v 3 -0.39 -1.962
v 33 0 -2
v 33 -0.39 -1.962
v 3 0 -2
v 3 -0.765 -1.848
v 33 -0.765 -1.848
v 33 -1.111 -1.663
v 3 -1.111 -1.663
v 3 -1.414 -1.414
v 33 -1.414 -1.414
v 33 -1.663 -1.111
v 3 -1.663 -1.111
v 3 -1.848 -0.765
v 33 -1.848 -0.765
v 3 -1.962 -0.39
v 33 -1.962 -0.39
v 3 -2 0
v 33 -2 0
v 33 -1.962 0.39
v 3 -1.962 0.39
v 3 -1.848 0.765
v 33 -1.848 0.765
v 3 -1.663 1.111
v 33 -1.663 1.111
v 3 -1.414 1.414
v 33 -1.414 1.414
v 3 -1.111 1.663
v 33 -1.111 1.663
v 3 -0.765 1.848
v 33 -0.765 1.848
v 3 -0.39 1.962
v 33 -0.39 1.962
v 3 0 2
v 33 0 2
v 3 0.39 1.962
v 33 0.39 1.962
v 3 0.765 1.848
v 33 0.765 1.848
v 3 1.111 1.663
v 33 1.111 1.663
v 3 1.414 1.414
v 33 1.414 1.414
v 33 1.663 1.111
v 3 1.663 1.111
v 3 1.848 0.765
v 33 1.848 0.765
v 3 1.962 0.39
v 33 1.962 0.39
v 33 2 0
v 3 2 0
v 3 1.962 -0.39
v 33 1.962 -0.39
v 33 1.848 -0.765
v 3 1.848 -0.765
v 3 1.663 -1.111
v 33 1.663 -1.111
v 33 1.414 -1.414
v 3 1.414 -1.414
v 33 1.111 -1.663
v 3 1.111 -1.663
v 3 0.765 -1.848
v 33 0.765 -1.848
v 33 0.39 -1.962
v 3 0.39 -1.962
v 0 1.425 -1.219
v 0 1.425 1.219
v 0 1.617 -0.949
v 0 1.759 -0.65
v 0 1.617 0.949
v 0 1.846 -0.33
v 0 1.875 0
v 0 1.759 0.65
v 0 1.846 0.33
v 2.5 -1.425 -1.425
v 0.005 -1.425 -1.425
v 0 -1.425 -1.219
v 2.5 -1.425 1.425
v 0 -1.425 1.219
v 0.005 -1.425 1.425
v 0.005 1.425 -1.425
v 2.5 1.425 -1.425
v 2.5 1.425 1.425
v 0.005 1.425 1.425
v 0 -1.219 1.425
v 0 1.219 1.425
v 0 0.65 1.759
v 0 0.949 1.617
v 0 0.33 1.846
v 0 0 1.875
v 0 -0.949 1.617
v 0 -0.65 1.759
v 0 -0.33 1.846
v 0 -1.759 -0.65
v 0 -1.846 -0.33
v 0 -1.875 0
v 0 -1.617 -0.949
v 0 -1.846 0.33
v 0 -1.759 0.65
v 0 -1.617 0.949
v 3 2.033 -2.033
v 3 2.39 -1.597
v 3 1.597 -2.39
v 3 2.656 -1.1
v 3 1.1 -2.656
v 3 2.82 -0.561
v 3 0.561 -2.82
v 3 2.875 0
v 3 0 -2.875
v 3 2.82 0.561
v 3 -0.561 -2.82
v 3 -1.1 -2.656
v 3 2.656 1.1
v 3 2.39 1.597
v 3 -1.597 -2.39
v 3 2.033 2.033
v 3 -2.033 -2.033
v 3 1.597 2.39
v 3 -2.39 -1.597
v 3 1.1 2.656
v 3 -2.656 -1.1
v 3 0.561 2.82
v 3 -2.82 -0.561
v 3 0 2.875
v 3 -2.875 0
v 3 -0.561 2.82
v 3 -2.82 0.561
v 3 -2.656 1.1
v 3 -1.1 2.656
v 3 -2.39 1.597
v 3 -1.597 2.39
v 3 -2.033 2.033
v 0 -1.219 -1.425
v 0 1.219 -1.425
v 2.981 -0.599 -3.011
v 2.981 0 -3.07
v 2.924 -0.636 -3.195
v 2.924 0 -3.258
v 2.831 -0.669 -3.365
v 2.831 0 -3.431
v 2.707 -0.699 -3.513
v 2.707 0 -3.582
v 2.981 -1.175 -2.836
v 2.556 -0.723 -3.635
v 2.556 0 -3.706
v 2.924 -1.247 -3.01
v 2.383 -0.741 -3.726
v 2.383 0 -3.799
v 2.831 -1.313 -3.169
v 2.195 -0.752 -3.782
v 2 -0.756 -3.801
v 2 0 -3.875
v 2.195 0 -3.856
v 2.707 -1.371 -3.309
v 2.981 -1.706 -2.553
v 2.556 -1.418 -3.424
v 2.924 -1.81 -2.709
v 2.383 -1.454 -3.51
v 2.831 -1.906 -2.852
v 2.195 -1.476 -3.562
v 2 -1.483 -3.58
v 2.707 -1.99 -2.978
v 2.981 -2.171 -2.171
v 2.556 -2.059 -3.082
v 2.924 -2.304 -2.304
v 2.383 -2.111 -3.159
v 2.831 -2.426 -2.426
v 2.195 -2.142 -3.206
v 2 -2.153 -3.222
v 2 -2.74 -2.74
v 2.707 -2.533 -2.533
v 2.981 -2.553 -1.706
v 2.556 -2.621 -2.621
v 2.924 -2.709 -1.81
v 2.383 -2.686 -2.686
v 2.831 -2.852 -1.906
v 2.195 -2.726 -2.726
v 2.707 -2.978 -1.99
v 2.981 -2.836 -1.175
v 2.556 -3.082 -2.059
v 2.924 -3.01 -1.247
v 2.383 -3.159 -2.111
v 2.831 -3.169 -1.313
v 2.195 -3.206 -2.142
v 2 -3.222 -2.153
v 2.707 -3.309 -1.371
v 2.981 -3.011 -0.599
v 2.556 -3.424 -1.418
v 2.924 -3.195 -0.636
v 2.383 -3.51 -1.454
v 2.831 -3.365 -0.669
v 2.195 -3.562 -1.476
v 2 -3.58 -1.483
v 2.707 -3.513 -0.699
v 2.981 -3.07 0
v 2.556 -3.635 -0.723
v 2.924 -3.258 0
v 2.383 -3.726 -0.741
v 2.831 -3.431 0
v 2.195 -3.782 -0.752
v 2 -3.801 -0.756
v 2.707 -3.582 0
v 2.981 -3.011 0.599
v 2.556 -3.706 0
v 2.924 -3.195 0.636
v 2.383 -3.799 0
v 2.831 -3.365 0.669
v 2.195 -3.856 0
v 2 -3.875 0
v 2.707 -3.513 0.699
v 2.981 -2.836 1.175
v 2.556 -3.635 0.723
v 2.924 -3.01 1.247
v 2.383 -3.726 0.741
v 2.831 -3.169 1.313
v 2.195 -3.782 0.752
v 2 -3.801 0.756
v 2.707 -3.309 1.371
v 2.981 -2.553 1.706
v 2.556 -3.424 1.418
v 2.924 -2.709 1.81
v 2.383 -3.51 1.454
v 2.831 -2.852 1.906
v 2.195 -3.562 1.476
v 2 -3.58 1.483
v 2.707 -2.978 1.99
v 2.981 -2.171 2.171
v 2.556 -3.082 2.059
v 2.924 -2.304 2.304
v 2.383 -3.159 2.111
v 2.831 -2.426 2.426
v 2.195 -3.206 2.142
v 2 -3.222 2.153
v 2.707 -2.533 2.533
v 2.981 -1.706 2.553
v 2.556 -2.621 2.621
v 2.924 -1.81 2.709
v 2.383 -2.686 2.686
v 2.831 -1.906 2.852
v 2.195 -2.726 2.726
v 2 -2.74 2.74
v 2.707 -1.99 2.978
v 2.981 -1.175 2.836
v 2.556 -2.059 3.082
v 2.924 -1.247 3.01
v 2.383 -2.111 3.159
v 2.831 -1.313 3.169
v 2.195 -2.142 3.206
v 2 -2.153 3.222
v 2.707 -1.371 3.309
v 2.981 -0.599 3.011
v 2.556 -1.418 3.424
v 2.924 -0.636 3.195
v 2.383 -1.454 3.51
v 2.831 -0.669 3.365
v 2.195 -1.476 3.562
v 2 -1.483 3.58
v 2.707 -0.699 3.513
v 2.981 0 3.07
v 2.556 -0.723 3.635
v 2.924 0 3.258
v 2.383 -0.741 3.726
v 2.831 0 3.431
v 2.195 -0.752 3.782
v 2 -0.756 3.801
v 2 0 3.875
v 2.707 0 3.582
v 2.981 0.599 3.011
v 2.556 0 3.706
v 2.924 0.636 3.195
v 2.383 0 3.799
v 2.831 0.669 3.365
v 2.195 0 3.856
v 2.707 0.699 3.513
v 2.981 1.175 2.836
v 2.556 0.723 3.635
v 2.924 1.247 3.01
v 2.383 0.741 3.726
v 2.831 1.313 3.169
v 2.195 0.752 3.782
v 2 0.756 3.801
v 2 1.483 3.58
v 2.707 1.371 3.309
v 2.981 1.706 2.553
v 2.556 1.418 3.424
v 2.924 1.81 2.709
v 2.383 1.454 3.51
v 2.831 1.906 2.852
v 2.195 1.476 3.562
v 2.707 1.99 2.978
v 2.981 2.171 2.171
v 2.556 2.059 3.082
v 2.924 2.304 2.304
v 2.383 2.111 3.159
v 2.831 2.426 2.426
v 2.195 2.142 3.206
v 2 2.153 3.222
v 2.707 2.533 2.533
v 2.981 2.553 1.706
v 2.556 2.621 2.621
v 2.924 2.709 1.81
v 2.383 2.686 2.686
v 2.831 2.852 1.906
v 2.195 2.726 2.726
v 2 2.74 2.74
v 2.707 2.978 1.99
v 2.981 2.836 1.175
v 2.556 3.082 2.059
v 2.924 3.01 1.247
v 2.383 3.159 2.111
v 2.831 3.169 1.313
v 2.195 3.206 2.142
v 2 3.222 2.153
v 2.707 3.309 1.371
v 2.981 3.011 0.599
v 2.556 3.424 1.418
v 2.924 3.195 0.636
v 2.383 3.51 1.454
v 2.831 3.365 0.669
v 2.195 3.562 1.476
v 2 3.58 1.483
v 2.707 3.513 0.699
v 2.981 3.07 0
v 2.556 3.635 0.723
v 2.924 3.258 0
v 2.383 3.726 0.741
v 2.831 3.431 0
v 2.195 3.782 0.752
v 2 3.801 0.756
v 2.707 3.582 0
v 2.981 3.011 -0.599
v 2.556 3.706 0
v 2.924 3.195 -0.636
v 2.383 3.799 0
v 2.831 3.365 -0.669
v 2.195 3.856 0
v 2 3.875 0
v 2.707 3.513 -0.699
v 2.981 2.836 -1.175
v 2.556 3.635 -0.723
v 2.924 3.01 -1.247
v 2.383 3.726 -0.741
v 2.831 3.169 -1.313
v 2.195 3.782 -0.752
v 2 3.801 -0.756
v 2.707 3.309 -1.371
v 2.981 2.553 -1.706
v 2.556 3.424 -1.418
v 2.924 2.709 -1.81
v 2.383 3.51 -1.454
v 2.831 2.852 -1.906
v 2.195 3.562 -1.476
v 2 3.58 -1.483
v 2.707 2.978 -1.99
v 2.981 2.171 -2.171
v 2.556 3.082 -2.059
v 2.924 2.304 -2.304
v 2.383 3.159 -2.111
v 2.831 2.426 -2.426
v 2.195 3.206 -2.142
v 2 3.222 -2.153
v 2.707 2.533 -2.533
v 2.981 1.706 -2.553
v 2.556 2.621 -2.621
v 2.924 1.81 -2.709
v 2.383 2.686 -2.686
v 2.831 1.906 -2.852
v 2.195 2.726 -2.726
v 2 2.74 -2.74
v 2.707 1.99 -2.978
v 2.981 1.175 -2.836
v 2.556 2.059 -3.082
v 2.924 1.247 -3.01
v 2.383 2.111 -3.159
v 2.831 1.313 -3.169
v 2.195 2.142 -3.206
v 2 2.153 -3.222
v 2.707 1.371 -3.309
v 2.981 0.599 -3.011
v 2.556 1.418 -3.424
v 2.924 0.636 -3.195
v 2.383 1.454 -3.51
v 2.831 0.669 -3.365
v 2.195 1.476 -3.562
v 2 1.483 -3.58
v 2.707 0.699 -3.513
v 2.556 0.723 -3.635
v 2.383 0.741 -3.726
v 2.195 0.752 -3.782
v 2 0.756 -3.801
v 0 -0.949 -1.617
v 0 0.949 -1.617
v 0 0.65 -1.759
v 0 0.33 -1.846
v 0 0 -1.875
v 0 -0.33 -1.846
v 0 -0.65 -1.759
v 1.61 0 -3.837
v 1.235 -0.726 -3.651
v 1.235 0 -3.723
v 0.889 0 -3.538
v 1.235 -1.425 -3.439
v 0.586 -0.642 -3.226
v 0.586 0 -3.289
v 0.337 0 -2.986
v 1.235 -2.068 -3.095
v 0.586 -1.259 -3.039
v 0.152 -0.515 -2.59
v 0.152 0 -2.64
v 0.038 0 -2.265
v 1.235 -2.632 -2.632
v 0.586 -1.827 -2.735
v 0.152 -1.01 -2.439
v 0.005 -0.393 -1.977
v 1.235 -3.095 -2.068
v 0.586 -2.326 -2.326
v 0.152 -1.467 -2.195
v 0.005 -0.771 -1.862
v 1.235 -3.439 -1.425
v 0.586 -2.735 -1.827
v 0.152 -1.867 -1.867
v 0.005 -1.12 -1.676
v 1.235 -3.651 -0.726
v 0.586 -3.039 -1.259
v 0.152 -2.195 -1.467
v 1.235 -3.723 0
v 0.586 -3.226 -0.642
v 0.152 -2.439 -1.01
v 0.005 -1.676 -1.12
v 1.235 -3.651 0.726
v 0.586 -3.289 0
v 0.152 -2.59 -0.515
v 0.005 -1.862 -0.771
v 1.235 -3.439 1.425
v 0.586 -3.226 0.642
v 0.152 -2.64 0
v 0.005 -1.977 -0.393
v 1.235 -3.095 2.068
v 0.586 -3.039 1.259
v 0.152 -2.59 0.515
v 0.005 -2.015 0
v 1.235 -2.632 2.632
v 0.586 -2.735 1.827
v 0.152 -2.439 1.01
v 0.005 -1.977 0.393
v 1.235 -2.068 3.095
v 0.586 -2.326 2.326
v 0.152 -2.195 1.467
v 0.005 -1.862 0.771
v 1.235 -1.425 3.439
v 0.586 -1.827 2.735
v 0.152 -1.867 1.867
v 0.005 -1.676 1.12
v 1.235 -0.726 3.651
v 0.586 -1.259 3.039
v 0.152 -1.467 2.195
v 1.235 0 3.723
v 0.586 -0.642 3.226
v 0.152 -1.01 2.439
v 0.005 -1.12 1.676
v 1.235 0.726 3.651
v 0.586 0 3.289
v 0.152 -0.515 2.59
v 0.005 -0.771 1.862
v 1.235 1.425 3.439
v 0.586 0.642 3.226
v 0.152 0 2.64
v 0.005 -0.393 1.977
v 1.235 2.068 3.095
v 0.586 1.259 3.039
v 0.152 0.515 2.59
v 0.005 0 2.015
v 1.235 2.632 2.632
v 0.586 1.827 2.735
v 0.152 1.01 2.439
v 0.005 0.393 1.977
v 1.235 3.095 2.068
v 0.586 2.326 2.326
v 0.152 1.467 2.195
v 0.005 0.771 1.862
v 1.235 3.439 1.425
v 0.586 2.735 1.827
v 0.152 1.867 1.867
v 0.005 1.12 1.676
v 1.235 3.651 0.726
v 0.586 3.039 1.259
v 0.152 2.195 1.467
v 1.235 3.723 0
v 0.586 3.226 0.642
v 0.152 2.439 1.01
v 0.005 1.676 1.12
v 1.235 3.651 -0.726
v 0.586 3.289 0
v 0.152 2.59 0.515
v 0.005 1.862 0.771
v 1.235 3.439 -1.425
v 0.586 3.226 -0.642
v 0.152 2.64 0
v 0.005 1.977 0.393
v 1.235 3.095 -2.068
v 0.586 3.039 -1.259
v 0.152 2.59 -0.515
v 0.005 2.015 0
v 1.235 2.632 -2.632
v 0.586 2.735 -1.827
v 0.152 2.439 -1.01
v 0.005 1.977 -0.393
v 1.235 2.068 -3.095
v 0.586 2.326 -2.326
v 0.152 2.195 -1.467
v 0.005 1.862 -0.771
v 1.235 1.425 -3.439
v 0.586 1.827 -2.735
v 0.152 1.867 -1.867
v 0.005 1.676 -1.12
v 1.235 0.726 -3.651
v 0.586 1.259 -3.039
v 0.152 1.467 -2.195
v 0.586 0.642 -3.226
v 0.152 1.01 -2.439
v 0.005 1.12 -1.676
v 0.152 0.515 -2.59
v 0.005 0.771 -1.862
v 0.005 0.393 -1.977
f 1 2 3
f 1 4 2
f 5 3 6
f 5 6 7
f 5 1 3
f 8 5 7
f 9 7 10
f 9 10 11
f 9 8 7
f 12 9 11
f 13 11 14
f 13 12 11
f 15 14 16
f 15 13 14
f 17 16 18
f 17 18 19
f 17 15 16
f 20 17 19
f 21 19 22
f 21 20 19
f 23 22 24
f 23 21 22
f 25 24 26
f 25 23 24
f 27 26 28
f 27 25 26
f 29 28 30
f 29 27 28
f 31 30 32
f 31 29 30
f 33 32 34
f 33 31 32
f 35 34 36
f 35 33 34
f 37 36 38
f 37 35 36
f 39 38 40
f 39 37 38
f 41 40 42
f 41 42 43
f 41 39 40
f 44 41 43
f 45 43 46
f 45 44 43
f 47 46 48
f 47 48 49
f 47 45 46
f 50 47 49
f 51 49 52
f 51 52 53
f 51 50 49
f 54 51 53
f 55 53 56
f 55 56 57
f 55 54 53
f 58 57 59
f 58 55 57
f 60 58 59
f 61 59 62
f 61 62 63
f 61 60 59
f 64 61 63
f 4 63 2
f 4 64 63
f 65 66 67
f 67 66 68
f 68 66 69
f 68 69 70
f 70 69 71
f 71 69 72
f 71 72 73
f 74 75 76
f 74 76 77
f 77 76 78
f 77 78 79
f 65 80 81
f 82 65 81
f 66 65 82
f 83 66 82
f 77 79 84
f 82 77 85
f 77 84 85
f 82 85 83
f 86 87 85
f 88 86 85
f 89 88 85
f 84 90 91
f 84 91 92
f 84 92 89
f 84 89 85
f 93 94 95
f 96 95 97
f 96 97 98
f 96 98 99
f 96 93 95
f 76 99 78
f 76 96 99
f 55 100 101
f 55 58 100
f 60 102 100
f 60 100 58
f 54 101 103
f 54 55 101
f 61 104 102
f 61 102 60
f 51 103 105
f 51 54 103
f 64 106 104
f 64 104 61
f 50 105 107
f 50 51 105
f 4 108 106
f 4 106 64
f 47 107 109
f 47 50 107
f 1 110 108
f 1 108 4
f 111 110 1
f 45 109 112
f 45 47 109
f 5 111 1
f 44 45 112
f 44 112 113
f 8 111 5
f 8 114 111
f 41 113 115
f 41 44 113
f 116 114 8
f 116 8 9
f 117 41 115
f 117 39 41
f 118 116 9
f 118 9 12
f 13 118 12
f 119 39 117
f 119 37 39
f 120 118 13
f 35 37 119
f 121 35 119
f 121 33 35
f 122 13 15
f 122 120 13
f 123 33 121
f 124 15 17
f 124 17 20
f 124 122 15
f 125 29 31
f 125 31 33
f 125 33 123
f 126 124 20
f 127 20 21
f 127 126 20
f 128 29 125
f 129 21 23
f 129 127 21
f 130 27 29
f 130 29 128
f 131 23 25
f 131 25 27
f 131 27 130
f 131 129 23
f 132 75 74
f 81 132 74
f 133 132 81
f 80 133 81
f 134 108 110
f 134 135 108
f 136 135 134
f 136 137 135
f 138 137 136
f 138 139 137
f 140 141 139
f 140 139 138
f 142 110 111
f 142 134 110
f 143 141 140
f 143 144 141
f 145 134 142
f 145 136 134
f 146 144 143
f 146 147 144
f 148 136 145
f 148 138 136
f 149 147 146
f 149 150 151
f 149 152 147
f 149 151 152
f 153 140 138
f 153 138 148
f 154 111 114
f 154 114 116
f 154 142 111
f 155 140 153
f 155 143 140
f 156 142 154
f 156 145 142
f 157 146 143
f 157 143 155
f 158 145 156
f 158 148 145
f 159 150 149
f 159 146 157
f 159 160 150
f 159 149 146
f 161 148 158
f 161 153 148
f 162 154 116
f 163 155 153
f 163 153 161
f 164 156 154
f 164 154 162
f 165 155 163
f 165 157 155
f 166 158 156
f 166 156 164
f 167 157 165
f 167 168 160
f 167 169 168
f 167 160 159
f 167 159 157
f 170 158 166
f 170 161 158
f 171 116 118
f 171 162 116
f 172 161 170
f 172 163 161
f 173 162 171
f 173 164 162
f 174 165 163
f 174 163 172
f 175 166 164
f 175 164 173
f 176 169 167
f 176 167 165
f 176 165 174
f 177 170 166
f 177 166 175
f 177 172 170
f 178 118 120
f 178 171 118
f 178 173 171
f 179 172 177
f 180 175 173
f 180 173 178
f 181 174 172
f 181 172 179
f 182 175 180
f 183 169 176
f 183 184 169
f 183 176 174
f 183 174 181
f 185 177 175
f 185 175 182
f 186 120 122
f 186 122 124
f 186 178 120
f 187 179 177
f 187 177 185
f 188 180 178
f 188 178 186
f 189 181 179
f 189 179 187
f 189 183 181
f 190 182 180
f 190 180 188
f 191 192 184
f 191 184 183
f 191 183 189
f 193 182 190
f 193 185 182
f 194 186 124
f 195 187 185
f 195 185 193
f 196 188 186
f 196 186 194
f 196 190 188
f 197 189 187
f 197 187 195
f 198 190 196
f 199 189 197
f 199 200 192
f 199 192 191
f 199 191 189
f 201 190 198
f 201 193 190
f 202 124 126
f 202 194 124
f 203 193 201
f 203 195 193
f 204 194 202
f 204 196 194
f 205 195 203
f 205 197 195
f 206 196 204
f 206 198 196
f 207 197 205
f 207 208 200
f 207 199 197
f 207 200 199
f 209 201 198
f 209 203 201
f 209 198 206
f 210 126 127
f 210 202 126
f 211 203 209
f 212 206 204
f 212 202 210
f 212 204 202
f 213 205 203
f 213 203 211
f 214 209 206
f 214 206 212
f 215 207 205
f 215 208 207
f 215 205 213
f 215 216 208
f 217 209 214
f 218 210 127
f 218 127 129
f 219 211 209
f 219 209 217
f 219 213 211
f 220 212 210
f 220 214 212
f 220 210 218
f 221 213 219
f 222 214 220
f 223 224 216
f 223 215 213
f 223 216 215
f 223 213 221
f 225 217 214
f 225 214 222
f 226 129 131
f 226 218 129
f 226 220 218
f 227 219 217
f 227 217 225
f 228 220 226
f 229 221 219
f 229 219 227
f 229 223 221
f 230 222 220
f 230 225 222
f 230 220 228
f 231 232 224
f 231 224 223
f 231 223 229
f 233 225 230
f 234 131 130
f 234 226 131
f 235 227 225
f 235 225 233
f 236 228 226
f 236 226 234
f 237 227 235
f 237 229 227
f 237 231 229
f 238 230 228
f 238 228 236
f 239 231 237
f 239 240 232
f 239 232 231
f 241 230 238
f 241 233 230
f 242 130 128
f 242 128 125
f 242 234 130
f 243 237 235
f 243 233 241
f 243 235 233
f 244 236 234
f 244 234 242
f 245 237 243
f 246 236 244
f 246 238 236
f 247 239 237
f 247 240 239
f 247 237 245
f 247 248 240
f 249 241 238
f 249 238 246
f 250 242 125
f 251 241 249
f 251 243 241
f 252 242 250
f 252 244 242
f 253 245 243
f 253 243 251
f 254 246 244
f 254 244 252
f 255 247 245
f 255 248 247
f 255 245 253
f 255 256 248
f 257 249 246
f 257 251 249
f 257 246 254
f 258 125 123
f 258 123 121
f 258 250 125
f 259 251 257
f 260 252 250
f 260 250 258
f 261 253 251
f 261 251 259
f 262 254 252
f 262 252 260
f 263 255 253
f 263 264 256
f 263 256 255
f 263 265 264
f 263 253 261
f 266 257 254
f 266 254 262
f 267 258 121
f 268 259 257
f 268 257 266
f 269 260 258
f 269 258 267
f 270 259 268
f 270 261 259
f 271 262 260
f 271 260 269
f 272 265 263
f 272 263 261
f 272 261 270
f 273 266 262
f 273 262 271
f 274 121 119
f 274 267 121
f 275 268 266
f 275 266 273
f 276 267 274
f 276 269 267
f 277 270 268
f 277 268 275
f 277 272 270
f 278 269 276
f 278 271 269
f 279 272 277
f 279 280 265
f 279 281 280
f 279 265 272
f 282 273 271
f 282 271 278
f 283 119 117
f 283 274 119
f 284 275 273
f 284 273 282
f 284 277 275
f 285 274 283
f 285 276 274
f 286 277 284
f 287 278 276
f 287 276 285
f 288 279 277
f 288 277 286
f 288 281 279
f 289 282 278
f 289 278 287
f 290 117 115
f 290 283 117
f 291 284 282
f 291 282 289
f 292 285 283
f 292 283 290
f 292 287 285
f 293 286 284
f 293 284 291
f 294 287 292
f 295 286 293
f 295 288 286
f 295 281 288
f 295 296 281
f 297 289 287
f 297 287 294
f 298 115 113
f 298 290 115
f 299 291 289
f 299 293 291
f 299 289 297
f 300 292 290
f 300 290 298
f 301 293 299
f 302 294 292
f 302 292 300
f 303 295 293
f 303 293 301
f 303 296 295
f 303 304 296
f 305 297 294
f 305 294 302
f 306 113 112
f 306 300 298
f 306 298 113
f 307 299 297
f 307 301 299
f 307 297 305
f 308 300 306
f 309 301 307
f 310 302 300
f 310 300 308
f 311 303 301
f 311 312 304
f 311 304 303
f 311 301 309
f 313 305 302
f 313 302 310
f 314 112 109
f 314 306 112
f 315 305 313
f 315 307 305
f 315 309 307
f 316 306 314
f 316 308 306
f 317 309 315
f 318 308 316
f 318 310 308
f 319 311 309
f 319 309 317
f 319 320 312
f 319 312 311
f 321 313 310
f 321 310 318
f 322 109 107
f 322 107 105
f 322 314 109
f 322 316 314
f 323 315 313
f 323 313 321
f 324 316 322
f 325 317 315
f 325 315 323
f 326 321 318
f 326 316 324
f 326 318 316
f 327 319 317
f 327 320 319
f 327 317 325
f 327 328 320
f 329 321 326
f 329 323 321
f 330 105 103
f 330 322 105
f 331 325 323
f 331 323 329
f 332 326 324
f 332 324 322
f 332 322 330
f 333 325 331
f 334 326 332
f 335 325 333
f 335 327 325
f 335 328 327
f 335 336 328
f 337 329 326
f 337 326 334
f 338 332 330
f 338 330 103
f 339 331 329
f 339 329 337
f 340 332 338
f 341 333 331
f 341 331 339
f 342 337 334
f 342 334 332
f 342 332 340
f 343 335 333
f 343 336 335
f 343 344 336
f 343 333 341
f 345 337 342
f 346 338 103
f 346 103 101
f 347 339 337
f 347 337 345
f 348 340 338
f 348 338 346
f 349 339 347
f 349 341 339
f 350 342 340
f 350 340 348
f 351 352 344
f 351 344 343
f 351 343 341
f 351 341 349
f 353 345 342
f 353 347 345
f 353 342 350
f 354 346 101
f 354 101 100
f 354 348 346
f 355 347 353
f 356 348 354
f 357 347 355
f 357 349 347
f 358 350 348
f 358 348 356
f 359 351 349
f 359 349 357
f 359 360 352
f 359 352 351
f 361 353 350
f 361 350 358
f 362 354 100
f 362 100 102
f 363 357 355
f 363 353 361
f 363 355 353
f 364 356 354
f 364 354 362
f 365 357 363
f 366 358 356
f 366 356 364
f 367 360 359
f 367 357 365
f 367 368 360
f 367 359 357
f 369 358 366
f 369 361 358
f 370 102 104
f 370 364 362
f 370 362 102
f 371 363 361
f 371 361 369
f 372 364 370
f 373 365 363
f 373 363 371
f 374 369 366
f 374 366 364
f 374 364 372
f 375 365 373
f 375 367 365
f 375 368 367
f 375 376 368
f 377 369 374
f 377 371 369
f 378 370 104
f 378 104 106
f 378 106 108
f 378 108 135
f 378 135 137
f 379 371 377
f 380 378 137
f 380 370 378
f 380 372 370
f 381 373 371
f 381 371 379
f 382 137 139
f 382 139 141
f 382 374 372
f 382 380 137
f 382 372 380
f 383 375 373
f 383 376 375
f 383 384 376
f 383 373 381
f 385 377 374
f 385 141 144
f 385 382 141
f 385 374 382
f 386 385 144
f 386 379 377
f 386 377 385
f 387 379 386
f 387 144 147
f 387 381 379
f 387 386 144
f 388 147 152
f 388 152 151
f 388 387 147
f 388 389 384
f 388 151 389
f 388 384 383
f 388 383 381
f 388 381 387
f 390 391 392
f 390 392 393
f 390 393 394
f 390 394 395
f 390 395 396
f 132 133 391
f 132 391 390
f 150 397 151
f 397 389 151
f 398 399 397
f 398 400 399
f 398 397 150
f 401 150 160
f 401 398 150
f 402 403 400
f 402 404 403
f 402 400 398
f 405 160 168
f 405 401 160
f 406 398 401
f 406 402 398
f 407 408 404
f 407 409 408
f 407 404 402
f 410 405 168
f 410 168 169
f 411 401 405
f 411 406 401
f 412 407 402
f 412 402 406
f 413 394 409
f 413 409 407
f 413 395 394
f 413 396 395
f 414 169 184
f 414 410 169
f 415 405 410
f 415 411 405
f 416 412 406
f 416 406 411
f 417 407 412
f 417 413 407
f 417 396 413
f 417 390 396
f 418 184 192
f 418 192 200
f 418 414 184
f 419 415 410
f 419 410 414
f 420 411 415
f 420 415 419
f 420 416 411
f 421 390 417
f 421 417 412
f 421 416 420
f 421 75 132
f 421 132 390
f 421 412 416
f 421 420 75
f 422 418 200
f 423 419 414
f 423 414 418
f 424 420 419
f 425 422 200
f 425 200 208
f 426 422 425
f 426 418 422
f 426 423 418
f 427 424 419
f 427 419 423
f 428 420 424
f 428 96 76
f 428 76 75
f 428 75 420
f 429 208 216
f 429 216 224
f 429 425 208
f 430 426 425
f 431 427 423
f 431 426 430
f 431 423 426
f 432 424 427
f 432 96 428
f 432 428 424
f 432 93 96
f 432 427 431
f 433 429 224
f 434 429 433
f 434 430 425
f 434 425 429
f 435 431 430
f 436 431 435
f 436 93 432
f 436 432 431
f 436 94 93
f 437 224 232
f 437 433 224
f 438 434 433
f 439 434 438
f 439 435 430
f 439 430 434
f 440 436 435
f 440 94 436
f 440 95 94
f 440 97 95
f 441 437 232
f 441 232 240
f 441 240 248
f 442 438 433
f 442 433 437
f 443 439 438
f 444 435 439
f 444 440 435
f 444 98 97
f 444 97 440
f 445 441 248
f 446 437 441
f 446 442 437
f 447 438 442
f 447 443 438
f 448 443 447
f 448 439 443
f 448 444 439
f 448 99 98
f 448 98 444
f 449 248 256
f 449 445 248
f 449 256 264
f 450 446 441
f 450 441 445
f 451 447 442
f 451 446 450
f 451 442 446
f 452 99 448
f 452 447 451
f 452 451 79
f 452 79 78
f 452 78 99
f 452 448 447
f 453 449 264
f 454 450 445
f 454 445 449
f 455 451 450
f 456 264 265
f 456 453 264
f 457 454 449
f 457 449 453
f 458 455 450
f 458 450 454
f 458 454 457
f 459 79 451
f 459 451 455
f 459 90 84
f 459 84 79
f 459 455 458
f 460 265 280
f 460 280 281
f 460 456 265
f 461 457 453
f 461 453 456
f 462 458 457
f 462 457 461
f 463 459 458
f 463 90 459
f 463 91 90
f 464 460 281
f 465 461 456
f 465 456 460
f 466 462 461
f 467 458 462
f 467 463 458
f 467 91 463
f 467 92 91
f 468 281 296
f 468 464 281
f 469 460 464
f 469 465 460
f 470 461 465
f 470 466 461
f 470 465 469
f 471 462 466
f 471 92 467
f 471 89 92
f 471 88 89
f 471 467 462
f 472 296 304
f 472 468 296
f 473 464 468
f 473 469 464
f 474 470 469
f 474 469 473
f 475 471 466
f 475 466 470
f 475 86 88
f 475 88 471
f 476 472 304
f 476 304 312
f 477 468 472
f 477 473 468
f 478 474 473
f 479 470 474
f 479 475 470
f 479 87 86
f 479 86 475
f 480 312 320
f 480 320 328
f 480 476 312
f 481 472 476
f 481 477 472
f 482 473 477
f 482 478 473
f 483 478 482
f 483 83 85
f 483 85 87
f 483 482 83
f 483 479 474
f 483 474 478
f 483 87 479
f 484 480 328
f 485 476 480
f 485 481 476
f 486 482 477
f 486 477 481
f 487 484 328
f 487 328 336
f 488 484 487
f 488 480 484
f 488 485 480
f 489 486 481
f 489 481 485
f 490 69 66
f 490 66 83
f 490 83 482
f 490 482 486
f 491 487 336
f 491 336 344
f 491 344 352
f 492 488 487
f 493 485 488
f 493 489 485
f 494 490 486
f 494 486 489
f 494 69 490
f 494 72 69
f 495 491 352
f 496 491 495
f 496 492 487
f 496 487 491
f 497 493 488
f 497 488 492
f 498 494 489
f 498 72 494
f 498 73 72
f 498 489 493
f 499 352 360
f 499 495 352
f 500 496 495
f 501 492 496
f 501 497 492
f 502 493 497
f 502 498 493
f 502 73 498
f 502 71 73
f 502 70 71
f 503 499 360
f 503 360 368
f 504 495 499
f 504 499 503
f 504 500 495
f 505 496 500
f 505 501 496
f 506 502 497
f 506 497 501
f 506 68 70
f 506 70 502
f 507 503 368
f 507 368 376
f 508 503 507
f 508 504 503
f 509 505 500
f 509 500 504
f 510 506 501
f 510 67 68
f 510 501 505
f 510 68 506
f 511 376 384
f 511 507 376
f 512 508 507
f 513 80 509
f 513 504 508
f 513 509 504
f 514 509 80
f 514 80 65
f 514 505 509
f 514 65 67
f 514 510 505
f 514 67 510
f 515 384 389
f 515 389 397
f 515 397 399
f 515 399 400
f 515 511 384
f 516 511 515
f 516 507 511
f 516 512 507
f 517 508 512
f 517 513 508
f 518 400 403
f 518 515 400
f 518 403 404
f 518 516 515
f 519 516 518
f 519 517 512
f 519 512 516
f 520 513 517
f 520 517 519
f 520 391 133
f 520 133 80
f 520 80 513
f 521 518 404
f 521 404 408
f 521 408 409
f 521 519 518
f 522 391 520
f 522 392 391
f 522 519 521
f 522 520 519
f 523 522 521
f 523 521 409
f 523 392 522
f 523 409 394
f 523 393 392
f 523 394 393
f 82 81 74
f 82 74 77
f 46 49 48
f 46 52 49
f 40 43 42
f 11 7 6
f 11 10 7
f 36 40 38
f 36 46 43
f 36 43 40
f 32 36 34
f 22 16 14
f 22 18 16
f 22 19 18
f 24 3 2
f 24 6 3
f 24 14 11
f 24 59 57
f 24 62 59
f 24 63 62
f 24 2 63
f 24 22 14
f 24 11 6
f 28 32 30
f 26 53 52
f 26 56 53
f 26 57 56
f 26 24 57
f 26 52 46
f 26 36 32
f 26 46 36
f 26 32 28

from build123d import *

# Parameters (mm, degrees)
SKETCH2_W          = 2.85
SKETCH2_H          = 2.85
CUT_EXTRUDE1_DEPTH = 2.5


with BuildPart() as part:
    # Sketch1 → Revolve1 (revolve)
    with BuildSketch(Plane.XY, mode=Mode.PRIVATE) as revolve1_sk:
        with BuildLine():
            Line((0, 0), (33, 0))
            Line((33, 0), (33, 2))
            Line((33, 2), (3, 2))
            Line((3, 2), (3, 2.875))
            ThreePointArc((3, 2.875), (2.707106781, 3.582106781), (2, 3.875))
            ThreePointArc((2, 3.875), (0.585786438, 3.289213562), (0, 1.875))
            Line((0, 1.875), (0, 0))
        make_face()
    revolve(revolve1_sk.sketch.rotate(Axis((0, 0, 0), (-1, 0, 0)), 90), axis=Axis((0, 0, 0), (-1, 0, 0)))

    # Sketch2 → Cut-Extrude1 (cut)
    with BuildSketch(Plane.ZY):
        Rectangle(SKETCH2_W, SKETCH2_H)
    extrude(amount=-CUT_EXTRUDE1_DEPTH, mode=Mode.SUBTRACT)


solid = part.part
